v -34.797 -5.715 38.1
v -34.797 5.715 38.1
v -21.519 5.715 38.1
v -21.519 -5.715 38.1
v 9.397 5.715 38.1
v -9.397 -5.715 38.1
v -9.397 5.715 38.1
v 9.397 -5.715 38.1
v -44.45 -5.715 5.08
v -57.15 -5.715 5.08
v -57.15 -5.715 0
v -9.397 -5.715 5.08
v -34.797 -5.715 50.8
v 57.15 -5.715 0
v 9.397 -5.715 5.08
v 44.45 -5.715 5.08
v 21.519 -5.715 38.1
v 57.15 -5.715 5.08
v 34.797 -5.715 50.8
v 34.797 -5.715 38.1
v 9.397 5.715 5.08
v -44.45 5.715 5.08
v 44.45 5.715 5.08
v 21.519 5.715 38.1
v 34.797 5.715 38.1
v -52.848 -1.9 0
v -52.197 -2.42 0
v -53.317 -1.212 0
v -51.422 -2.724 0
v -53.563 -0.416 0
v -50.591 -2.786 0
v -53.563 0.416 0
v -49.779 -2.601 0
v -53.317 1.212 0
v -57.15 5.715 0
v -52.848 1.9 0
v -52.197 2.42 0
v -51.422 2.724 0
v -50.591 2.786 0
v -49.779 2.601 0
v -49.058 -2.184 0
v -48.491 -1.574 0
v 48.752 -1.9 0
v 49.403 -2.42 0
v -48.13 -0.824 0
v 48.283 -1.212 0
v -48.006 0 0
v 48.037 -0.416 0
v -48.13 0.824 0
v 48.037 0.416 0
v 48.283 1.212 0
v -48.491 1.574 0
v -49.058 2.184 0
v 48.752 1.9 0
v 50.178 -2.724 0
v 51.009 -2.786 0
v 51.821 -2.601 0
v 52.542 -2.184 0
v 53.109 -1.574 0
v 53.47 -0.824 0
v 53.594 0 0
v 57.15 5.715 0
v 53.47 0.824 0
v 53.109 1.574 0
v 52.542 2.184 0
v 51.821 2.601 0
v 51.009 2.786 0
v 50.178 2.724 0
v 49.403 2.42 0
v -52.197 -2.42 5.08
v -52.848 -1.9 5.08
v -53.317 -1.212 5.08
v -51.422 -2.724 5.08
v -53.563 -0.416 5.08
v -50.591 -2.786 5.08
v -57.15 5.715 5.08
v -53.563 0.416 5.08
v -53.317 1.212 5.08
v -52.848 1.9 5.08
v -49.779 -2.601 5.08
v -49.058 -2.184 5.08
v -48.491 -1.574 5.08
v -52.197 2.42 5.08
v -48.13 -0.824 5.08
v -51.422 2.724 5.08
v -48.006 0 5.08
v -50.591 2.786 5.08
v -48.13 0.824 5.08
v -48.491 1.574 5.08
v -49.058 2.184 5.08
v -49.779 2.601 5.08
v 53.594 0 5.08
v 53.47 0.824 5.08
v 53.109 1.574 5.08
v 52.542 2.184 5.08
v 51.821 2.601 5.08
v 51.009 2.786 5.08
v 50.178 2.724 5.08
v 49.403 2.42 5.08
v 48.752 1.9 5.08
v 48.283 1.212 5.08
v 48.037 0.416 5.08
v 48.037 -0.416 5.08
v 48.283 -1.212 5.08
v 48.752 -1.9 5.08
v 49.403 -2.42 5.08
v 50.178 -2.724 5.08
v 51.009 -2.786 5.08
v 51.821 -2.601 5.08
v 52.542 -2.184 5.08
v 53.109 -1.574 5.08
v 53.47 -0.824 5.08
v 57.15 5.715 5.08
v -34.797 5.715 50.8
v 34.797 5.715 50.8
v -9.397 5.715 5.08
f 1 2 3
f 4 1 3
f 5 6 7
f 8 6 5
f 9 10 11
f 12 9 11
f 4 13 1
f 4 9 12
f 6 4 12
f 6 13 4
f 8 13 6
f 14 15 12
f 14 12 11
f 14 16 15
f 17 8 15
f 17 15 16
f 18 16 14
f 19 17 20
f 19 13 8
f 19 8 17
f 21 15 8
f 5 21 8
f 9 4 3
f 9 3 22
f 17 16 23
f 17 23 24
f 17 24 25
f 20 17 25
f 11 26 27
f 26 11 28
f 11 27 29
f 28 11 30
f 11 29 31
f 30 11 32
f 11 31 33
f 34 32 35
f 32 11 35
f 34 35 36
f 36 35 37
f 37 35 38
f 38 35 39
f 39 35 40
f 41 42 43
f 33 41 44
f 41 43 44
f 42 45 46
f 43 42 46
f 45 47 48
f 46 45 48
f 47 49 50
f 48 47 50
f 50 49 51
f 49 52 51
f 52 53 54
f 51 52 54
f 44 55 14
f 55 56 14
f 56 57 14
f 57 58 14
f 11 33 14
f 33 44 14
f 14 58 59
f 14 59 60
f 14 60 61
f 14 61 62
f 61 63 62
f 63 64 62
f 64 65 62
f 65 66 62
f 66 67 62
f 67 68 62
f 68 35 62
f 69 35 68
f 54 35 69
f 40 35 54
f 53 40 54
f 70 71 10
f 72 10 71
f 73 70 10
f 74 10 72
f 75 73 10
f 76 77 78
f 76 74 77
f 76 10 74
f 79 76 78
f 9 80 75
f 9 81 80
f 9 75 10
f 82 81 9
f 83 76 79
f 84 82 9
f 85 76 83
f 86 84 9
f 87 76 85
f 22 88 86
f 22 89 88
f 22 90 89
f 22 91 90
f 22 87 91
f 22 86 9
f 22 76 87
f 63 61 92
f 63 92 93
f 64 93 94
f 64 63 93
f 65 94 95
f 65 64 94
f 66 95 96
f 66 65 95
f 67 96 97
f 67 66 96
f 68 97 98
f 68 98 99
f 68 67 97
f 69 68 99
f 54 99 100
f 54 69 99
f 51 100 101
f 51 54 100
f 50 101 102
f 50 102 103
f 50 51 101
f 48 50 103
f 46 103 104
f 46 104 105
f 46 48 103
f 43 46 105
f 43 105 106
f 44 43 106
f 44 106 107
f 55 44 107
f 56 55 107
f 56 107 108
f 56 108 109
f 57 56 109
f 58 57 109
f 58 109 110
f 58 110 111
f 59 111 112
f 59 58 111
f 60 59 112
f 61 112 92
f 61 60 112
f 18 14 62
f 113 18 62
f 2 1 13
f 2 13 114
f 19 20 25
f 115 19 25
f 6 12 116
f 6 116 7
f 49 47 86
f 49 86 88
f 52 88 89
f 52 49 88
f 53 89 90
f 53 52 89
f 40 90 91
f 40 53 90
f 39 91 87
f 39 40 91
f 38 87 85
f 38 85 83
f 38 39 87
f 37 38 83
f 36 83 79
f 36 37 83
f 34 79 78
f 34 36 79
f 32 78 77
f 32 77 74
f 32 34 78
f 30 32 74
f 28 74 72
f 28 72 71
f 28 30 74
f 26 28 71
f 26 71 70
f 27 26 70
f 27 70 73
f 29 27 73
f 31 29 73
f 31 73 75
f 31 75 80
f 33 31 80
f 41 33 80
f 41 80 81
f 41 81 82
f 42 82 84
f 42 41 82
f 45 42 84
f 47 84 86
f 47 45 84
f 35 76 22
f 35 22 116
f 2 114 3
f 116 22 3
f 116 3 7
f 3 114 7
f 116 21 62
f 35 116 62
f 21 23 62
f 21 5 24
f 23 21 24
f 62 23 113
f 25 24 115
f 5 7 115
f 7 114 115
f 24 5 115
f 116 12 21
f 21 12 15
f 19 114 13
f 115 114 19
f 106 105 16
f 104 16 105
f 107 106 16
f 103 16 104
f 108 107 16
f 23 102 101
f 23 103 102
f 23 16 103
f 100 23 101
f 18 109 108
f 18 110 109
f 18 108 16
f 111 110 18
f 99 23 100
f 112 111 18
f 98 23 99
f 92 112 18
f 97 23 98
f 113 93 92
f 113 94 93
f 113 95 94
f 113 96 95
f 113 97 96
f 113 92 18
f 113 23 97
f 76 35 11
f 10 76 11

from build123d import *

# Parameters (mm, degrees)
SKETCH1_R           = 2.794
BOSS_EXTRUDE1_DEPTH = 5.08
SKETCH3_W           = 25.4
SKETCH3_H           = 11.43
BOSS_EXTRUDE2_DEPTH = 45.72
SKETCH4_W           = 22.096687199
SKETCH4_H           = 11.43
BOSS_EXTRUDE3_DEPTH = 12.7
BOSS_EXTRUDE5_DEPTH = 11.43
SKETCH7_W           = 18.793374398
SKETCH7_H           = 33.02
CUT_EXTRUDE3_DEPTH  = 12.7


with BuildPart() as part:
    # Sketch1 → Boss-Extrude1 (new body)
    with BuildSketch(Plane.XY):
        Polygon((-57.15, 2.54), (-57.15, -2.54), (-57.15, -5.715), (57.15, -5.715), (57.15, -2.54), (57.15, 2.54), (57.15, 5.715), (-57.15, 5.715), align=None)
        with Locations((50.8, 0)):
            Circle(SKETCH1_R, mode=Mode.SUBTRACT)
        with Locations((-50.8, 0)):
            Circle(SKETCH1_R, mode=Mode.SUBTRACT)
    extrude(amount=BOSS_EXTRUDE1_DEPTH)

    # Sketch3 → Boss-Extrude2 (add)
    with BuildSketch(Plane.XY.offset(5.08)):
        Rectangle(SKETCH3_W, SKETCH3_H)
    extrude(amount=BOSS_EXTRUDE2_DEPTH)

    # Sketch4 → Boss-Extrude3 (add)
    with BuildSketch(Plane.XY.offset(50.8)):
        with Locations((23.7483436, 0)):
            Rectangle(SKETCH4_W, SKETCH4_H)
        with Locations((-23.7483436, 0)):
            Rectangle(SKETCH4_W, SKETCH4_H)
    extrude(amount=-BOSS_EXTRUDE3_DEPTH)

    # Sketch5 → Boss-Extrude5 (add)
    with BuildSketch(Plane.XZ.offset(5.715)):
        Polygon((-44.45, 5.08), (-12.7, 5.08), (-12.7, 38.1), (-21.519444444, 38.1), align=None)
        Polygon((12.7, 38.1), (12.7, 5.08), (44.45, 5.08), (21.519444444, 38.1), align=None)
    extrude(amount=-BOSS_EXTRUDE5_DEPTH)

    # Sketch7 → Cut-Extrude3 (cut)
    with BuildSketch(Plane.XZ.offset(5.715)):
        with Locations((0, 21.59)):
            Rectangle(SKETCH7_W, SKETCH7_H)
    extrude(amount=-CUT_EXTRUDE3_DEPTH, mode=Mode.SUBTRACT)


solid = part.part
